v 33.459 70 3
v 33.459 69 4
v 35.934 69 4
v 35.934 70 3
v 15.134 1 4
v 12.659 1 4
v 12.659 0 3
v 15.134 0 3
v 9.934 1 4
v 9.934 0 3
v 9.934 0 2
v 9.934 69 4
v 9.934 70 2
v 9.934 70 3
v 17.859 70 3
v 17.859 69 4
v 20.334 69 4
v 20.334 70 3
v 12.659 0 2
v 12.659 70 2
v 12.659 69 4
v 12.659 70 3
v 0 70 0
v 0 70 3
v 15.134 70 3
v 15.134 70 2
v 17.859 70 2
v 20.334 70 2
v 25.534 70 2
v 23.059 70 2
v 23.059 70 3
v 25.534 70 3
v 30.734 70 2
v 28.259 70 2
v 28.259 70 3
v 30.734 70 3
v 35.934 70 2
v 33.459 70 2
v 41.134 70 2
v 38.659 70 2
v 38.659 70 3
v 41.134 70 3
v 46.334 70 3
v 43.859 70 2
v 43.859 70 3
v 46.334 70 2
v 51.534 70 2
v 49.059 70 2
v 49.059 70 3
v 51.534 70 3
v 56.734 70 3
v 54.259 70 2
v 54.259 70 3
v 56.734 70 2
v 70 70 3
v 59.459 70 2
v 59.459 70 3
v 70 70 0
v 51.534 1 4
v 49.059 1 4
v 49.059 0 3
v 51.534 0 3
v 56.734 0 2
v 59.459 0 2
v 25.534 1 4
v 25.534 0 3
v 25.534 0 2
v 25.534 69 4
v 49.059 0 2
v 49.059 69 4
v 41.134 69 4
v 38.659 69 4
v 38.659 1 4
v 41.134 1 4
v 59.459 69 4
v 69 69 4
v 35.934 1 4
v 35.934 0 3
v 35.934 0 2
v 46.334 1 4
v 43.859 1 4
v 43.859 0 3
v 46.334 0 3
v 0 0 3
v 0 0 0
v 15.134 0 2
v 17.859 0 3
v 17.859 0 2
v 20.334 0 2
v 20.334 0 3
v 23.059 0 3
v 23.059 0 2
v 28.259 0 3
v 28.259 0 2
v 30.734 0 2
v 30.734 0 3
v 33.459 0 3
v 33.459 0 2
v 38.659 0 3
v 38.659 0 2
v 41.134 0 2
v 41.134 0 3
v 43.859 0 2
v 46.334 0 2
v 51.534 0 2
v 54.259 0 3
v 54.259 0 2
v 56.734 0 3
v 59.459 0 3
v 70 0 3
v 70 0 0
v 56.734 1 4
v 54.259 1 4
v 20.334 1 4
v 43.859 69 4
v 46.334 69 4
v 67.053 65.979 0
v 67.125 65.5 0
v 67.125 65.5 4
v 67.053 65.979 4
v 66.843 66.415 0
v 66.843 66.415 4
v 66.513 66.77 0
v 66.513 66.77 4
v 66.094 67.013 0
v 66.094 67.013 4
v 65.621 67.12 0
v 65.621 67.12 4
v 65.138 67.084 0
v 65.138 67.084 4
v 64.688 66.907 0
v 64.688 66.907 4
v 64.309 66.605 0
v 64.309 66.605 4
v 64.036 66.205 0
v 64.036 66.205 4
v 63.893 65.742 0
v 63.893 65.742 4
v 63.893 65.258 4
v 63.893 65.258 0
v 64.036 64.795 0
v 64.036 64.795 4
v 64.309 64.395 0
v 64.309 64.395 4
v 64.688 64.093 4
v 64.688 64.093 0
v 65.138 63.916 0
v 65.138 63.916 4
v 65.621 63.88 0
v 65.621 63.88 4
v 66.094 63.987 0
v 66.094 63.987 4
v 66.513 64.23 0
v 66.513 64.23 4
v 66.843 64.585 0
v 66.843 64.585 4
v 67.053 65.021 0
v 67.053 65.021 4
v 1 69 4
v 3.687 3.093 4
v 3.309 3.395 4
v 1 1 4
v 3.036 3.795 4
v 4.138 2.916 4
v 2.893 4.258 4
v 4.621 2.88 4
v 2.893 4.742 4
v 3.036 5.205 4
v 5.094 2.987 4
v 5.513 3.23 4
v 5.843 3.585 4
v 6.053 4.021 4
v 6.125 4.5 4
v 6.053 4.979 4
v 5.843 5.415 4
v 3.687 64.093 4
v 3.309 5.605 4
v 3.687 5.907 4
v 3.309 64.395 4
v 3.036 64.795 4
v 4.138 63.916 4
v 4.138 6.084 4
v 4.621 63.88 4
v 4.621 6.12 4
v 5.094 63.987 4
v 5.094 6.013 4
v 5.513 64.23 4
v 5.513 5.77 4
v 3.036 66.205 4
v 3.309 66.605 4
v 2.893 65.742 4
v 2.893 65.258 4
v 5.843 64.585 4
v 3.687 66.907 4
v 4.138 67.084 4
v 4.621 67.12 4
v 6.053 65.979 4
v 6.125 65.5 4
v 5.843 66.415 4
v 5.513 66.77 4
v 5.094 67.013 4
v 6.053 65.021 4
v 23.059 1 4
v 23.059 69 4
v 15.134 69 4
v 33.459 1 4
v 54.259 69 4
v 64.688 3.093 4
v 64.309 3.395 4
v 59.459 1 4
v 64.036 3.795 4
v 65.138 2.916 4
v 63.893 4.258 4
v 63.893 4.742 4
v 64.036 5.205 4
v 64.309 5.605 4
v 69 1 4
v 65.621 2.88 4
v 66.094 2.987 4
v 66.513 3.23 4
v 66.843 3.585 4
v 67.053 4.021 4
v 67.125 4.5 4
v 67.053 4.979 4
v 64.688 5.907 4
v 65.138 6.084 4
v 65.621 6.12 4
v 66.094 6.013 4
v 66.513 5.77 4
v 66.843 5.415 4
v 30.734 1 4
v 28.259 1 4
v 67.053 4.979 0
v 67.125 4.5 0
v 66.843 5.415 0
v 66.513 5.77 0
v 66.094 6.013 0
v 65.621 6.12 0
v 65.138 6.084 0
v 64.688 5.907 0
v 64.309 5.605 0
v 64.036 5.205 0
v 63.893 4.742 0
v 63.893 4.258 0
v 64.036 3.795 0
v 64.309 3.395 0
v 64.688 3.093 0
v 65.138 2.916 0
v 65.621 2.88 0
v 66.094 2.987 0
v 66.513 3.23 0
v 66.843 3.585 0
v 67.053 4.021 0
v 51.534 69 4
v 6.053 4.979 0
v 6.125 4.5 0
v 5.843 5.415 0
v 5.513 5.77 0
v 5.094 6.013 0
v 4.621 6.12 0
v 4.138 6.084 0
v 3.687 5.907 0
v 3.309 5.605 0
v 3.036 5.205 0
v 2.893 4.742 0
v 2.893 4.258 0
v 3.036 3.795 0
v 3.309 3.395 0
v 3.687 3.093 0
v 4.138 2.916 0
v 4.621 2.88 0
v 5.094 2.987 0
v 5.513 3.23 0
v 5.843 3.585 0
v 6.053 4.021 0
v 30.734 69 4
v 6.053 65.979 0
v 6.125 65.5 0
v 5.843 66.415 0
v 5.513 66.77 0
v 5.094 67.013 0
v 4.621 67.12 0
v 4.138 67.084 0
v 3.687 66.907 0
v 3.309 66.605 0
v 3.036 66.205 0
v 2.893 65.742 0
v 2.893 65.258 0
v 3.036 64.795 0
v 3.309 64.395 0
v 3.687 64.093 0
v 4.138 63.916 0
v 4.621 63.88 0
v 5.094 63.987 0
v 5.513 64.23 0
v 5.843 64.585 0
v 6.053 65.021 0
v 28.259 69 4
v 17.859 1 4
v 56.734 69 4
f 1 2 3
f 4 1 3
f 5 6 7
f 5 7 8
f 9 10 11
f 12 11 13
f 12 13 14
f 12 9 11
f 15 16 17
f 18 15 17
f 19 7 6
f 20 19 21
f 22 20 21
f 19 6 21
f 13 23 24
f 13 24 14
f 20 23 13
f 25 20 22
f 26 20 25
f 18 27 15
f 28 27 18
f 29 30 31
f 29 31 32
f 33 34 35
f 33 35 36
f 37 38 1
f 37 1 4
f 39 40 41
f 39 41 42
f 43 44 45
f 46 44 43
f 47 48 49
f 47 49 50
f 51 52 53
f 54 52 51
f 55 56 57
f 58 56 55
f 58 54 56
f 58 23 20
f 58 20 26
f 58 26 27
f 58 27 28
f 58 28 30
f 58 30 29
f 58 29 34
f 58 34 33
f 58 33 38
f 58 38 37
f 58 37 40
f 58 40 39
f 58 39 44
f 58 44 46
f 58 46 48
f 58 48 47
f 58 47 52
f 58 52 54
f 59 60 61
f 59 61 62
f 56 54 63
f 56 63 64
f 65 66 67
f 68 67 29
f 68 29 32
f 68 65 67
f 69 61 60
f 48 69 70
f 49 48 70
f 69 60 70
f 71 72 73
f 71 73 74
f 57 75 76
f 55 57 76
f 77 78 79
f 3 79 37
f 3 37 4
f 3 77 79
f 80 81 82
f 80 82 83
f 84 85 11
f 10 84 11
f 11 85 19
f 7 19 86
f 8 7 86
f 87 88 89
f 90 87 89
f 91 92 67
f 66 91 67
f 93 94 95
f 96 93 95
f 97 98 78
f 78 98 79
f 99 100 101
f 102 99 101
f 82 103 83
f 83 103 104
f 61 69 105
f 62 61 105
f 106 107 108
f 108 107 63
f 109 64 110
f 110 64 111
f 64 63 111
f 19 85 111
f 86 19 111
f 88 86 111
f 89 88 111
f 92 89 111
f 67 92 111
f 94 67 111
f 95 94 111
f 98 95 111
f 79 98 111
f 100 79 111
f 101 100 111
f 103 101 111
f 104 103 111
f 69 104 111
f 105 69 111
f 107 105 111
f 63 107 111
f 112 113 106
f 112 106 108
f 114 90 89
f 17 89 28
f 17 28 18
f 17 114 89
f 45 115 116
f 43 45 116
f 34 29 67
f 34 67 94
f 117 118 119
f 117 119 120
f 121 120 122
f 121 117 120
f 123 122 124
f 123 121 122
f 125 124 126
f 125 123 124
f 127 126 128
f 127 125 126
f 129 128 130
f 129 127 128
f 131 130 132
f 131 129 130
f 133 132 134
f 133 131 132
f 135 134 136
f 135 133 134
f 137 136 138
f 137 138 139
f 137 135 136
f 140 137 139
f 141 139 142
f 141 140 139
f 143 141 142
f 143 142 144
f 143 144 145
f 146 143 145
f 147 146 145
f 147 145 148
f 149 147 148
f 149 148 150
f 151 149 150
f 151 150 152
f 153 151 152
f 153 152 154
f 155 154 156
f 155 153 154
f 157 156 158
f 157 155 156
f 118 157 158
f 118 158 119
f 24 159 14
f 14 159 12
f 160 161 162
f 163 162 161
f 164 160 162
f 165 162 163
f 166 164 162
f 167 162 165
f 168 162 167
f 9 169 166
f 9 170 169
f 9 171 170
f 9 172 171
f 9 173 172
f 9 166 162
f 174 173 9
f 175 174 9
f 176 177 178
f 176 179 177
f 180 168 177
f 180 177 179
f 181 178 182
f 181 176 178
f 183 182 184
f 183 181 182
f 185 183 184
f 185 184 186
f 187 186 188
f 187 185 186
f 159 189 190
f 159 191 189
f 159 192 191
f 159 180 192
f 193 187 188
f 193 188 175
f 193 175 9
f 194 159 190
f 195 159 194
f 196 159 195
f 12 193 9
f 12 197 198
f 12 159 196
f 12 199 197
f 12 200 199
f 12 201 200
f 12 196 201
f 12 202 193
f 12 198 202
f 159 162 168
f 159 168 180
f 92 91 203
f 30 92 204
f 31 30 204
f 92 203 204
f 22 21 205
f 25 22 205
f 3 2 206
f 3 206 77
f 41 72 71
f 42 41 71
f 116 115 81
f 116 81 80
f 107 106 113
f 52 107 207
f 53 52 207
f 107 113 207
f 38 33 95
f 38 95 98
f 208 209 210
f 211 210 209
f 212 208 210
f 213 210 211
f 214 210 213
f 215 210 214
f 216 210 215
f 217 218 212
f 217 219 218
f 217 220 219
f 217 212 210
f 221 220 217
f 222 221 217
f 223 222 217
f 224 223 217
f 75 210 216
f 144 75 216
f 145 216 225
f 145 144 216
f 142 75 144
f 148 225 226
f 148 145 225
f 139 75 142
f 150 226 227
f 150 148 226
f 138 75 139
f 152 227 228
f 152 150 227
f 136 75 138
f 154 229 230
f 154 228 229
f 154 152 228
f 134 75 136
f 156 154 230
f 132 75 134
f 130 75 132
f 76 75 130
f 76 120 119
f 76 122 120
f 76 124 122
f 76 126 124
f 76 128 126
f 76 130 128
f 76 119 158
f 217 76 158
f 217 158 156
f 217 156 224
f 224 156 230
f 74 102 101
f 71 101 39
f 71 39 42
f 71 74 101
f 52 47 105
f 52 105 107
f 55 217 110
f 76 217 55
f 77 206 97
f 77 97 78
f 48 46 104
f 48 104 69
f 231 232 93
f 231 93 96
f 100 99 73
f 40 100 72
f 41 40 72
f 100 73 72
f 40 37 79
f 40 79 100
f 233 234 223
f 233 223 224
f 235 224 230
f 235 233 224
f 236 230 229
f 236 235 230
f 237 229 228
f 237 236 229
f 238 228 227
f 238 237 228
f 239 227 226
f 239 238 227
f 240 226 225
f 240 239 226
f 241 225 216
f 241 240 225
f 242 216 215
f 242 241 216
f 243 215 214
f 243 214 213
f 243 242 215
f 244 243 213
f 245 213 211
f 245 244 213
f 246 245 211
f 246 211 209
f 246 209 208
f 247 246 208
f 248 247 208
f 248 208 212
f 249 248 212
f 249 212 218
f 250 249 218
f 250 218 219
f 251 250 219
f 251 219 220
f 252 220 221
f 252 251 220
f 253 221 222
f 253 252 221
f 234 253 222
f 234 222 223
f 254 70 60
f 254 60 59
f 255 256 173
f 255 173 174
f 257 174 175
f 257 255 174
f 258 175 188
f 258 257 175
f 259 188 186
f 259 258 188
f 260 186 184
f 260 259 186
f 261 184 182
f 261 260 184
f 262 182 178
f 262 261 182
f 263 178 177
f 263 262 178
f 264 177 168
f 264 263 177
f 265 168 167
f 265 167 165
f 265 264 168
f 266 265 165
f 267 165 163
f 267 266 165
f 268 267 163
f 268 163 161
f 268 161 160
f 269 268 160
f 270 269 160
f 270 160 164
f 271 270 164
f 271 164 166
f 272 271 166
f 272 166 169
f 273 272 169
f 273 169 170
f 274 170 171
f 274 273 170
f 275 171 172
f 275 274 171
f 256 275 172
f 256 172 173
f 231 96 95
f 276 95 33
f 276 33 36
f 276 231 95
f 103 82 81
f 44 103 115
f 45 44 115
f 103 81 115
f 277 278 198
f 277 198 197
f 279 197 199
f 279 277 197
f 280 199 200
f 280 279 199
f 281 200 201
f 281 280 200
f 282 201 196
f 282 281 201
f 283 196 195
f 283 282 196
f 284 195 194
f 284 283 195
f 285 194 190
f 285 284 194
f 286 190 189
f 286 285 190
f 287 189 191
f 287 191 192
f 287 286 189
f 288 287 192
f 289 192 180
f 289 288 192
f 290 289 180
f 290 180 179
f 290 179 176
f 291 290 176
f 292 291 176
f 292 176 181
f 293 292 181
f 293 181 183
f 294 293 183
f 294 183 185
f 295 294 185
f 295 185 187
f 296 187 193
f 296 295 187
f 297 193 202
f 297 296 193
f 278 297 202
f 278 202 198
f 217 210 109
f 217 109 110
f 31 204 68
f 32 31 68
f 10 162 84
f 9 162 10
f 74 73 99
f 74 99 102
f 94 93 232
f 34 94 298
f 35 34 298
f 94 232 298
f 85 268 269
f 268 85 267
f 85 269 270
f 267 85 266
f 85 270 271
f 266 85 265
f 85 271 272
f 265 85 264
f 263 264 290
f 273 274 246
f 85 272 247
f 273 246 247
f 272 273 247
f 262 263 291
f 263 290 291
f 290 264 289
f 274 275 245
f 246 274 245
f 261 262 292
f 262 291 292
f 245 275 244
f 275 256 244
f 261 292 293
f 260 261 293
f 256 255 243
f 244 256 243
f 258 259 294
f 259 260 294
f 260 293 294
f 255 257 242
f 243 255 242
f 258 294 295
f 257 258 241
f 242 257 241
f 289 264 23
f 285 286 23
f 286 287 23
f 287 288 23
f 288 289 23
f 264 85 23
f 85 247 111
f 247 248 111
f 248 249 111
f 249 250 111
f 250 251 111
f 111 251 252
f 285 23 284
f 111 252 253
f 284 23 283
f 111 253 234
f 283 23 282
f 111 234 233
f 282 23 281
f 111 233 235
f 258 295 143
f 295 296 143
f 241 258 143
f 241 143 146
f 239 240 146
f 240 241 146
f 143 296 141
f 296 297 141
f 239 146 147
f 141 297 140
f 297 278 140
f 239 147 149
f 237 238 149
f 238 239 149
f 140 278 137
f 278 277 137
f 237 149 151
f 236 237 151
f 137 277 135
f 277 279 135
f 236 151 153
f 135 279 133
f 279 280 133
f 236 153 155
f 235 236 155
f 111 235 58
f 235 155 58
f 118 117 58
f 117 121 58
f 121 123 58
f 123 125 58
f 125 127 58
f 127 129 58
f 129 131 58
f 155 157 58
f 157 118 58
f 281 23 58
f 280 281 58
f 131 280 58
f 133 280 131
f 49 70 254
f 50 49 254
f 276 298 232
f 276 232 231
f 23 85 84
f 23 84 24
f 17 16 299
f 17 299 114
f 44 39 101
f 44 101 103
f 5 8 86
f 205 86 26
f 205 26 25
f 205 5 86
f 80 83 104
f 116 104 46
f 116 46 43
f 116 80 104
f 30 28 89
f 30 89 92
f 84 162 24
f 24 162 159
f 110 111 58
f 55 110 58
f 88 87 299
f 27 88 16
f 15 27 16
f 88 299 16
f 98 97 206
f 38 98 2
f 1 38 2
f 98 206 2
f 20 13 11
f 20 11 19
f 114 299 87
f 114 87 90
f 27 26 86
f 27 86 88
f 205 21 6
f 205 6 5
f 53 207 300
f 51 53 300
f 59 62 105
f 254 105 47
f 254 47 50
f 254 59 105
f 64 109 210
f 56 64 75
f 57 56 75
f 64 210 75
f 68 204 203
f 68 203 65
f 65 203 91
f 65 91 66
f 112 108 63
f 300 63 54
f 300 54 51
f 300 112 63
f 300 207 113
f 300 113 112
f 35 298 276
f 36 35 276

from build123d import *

# Parameters (mm, degrees)
SKETCH1_W           = 70
SKETCH1_H           = 70
SKETCH1_R           = 1.625
BOSS_EXTRUDE1_DEPTH = 4
SKETCH2_W           = 2.725639952
SKETCH2_H           = 70
CUT_EXTRUDE1_DEPTH  = 2
CHAMFER1_SIZE       = 1


with BuildPart() as part:
    # Sketch1 → Boss-Extrude1 (new body)
    with BuildSketch(Plane.XY):
        with Locations((35, 35)):
            Rectangle(SKETCH1_W, SKETCH1_H)
        with Locations((4.5, 65.5)):
            Circle(SKETCH1_R, mode=Mode.SUBTRACT)
        with Locations((65.5, 65.5)):
            Circle(SKETCH1_R, mode=Mode.SUBTRACT)
        with Locations((65.5, 4.5)):
            Circle(SKETCH1_R, mode=Mode.SUBTRACT)
        with Locations((4.5, 4.5)):
            Circle(SKETCH1_R, mode=Mode.SUBTRACT)
    extrude(amount=BOSS_EXTRUDE1_DEPTH)

    # Sketch2 → Cut-Extrude1 (cut)
    with BuildSketch(Plane.XY.offset(4)):
        with Locations((11.296666841, 35)):
            Rectangle(SKETCH2_W, SKETCH2_H)
        with Locations((16.496666841, 35)):
            Rectangle(SKETCH2_W, SKETCH2_H)
        with Locations((21.696666841, 35)):
            Rectangle(SKETCH2_W, SKETCH2_H)
        with Locations((26.896666841, 35)):
            Rectangle(SKETCH2_W, SKETCH2_H)
        with Locations((32.096666841, 35)):
            Rectangle(SKETCH2_W, SKETCH2_H)
        with Locations((37.296666841, 35)):
            Rectangle(SKETCH2_W, SKETCH2_H)
        with Locations((42.496666841, 35)):
            Rectangle(SKETCH2_W, SKETCH2_H)
        with Locations((47.696666841, 35)):
            Rectangle(SKETCH2_W, SKETCH2_H)
        with Locations((52.896666841, 35)):
            Rectangle(SKETCH2_W, SKETCH2_H)
        with Locations((58.096666841, 35)):
            Rectangle(SKETCH2_W, SKETCH2_H)
    extrude(amount=-CUT_EXTRUDE1_DEPTH, mode=Mode.SUBTRACT)

    # Chamfer1
    chamfer1_edges = [part.edges().sort_by_distance(p)[0] for p in [
        (70, 35, 4),
        (64.729743409, 70, 4),
        (55.496666841, 70, 4),
        (50.296666841, 70, 4),
        (45.096666841, 70, 4),
        (39.896666841, 70, 4),
        (34.696666841, 70, 4),
        (29.496666841, 70, 4),
        (24.296666841, 70, 4),
        (19.096666841, 70, 4),
        (13.896666841, 70, 4),
        (4.966923432, 70, 4),
        (0, 35, 4),
        (13.896666841, 0, 4),
        (19.096666841, 0, 4),
        (24.296666841, 0, 4),
        (29.496666841, 0, 4),
        (34.696666841, 0, 4),
        (39.896666841, 0, 4),
        (45.096666841, 0, 4),
        (50.296666841, 0, 4),
        (55.496666841, 0, 4),
        (64.729743409, 0, 4),
        (4.966923432, 0, 4),
    ]]
    chamfer(chamfer1_edges, length=CHAMFER1_SIZE)


solid = part.part
